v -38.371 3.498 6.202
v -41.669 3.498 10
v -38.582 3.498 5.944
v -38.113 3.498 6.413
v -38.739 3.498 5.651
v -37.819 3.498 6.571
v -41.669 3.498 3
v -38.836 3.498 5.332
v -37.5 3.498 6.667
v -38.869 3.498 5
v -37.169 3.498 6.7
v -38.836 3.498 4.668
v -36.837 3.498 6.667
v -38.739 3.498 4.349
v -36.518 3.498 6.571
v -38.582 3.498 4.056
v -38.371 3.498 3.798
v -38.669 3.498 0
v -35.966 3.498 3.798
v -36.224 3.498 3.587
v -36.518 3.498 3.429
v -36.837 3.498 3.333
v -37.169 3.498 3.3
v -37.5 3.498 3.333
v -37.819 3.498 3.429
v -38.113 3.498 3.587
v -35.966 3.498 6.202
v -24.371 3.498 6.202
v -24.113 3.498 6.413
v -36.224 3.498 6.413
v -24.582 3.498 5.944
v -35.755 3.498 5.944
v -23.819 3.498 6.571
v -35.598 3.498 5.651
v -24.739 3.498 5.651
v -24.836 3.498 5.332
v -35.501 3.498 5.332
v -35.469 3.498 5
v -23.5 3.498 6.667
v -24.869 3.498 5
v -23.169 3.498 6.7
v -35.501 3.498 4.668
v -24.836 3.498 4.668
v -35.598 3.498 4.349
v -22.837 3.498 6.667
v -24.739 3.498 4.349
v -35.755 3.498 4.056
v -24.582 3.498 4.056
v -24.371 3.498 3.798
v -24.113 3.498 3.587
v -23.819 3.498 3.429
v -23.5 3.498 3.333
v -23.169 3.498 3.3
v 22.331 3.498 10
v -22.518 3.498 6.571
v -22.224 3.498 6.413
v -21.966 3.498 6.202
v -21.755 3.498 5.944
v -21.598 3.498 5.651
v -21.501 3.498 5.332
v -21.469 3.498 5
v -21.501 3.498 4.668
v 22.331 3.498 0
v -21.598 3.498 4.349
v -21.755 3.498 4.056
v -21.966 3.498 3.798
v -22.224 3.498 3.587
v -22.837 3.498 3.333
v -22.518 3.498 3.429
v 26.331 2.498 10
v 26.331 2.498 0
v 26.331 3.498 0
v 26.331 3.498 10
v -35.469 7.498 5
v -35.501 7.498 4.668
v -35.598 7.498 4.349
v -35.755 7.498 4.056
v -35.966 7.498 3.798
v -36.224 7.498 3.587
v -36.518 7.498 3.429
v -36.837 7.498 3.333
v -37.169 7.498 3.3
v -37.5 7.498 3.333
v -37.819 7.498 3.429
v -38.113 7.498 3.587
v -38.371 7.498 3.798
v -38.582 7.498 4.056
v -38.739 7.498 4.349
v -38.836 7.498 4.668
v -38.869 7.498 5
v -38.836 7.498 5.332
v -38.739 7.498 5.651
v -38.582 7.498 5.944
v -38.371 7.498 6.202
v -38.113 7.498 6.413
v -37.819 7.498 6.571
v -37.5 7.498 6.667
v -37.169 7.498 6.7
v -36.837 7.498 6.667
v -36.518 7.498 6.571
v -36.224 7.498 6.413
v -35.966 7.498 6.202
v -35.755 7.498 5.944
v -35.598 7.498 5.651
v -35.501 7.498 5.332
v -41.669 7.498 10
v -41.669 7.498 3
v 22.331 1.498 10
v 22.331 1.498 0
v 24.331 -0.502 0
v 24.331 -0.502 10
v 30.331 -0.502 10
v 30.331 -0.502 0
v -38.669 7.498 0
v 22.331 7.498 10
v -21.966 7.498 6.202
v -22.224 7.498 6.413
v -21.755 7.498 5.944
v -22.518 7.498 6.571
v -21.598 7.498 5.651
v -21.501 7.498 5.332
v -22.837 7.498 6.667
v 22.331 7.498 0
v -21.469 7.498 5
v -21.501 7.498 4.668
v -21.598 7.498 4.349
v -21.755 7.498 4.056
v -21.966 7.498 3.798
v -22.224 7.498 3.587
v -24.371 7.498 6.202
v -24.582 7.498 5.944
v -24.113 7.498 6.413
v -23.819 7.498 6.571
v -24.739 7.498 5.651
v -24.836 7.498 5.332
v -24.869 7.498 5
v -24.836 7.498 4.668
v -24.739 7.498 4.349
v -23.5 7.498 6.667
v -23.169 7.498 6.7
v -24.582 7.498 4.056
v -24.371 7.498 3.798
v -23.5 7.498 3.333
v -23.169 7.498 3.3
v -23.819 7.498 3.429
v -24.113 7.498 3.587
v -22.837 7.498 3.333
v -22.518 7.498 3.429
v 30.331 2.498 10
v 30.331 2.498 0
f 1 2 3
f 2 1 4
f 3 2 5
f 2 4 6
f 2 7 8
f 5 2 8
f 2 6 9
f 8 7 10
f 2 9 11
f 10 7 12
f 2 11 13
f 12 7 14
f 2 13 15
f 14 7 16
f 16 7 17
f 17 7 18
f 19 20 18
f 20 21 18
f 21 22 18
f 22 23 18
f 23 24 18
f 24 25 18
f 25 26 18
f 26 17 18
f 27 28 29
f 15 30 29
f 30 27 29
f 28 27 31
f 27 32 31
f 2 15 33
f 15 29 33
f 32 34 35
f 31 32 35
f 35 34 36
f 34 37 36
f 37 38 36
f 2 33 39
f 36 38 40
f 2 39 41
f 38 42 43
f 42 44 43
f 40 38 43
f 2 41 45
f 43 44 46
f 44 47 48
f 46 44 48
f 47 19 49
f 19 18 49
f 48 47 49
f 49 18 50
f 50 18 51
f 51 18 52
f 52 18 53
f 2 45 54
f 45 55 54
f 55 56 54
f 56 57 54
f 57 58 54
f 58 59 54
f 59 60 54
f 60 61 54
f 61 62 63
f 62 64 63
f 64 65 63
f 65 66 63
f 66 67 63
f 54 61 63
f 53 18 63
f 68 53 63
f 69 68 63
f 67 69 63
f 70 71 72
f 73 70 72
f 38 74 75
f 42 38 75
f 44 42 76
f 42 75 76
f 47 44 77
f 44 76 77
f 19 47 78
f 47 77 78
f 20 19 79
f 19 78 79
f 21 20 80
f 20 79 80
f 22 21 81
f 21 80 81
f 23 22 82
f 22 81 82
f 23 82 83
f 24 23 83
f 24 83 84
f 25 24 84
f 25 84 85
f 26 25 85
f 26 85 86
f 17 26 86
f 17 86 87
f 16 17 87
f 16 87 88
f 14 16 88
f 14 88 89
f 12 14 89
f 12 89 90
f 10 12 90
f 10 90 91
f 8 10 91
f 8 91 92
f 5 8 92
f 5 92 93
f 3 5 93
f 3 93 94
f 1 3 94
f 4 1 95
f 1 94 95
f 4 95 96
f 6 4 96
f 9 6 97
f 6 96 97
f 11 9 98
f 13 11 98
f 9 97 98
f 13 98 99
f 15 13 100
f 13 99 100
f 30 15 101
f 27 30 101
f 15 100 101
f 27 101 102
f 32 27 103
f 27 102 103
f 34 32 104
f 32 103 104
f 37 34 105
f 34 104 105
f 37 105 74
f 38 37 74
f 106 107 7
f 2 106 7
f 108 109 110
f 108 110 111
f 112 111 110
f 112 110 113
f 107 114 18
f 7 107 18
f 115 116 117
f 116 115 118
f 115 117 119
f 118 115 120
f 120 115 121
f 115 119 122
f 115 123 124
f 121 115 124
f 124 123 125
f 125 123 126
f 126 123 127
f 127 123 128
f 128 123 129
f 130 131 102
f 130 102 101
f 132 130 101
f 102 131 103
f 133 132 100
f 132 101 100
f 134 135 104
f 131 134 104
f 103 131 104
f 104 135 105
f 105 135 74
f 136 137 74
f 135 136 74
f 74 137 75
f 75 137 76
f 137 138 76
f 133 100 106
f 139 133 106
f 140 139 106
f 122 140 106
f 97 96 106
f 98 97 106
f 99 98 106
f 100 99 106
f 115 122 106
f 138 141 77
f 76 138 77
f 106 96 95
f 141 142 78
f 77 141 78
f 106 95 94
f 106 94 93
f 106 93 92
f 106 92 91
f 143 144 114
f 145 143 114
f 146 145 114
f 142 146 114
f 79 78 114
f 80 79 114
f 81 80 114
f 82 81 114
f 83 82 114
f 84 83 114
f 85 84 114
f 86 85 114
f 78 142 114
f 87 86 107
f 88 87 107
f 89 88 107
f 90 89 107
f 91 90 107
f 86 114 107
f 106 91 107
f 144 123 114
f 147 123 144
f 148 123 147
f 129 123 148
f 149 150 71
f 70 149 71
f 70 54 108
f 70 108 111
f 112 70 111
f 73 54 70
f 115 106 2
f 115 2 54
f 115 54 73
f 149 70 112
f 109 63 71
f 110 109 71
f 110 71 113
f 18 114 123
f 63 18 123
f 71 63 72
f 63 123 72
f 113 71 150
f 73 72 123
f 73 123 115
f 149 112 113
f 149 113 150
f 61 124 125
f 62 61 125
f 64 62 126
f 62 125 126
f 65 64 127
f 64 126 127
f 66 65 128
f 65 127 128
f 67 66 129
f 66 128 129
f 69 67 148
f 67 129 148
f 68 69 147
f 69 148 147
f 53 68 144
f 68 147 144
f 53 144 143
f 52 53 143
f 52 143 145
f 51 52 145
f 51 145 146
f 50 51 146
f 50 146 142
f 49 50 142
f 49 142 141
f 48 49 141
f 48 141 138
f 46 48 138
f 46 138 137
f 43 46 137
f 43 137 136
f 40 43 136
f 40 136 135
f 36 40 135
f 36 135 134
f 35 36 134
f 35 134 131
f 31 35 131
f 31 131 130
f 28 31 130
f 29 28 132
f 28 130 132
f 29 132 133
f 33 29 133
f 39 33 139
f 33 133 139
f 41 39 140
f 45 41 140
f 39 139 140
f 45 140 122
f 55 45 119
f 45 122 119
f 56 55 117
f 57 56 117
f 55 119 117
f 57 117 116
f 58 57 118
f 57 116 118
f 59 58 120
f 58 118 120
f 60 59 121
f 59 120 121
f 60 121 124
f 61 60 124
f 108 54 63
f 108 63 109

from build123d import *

# Parameters (mm, degrees)
BOSS_EXTRUDE1_DEPTH = 10
CHAMFER1_SIZE       = 3
CHAMFER4_SIZE       = 4
CHAMFER5_SIZE       = 2
CUT_EXTRUDE1_REACH  = 10
SKETCH4_R           = 1.7


with BuildPart() as part:
    # Sketch2 → Boss-Extrude1 (new body)
    with BuildSketch(Plane.XY):
        Polygon((-41.668551289, 7.497735583), (-41.668551289, 3.497735583), (22.331448711, 3.497735583), (22.331448711, -0.502264417), (30.331448711, -0.502264417), (30.331448711, 2.497735583), (26.331448711, 2.497735583), (26.331448711, 7.497735583), align=None)
    extrude(amount=BOSS_EXTRUDE1_DEPTH)

    # Chamfer1
    chamfer1_edges = [part.edges().sort_by_distance(p)[0] for p in [
        (-41.668551289, 5.497735583, 0),
    ]]
    chamfer(chamfer1_edges, length=CHAMFER1_SIZE)

    # Chamfer4
    chamfer4_edges = [part.edges().sort_by_distance(p)[0] for p in [
        (26.331448711, 7.497735583, 5),
    ]]
    chamfer(chamfer4_edges, length=CHAMFER4_SIZE)

    # Chamfer5
    chamfer5_edges = [part.edges().sort_by_distance(p)[0] for p in [
        (22.331448711, -0.502264417, 5),
    ]]
    chamfer(chamfer5_edges, length=CHAMFER5_SIZE)

    # Sketch4 → Cut-Extrude1 (cut, up to next)
    with BuildSketch(Plane(origin=(0, 7.497735583, 0), x_dir=(1, 0, 0), z_dir=(0, 1, 0)), mode=Mode.PRIVATE) as cut_extrude1_sk1:
        with Locations((-37.168551289, -5)):
            Circle(SKETCH4_R)
    cut_extrude1_tool1 = extrude(cut_extrude1_sk1.sketch, amount=-CUT_EXTRUDE1_REACH, mode=Mode.PRIVATE) & part.part
    add(cut_extrude1_tool1.solids().sort_by_distance((-37.168551, 7.497736, 5))[0], mode=Mode.SUBTRACT)
    # Sketch4 → Cut-Extrude1 (cut, up to next)
    with BuildSketch(Plane(origin=(0, 7.497735583, 0), x_dir=(1, 0, 0), z_dir=(0, 1, 0)), mode=Mode.PRIVATE) as cut_extrude1_sk2:
        with Locations((-23.168551289, -5)):
            Circle(SKETCH4_R)
    cut_extrude1_tool2 = extrude(cut_extrude1_sk2.sketch, amount=-CUT_EXTRUDE1_REACH, mode=Mode.PRIVATE) & part.part
    add(cut_extrude1_tool2.solids().sort_by_distance((-23.168551, 7.497736, 5))[0], mode=Mode.SUBTRACT)


solid = part.part
